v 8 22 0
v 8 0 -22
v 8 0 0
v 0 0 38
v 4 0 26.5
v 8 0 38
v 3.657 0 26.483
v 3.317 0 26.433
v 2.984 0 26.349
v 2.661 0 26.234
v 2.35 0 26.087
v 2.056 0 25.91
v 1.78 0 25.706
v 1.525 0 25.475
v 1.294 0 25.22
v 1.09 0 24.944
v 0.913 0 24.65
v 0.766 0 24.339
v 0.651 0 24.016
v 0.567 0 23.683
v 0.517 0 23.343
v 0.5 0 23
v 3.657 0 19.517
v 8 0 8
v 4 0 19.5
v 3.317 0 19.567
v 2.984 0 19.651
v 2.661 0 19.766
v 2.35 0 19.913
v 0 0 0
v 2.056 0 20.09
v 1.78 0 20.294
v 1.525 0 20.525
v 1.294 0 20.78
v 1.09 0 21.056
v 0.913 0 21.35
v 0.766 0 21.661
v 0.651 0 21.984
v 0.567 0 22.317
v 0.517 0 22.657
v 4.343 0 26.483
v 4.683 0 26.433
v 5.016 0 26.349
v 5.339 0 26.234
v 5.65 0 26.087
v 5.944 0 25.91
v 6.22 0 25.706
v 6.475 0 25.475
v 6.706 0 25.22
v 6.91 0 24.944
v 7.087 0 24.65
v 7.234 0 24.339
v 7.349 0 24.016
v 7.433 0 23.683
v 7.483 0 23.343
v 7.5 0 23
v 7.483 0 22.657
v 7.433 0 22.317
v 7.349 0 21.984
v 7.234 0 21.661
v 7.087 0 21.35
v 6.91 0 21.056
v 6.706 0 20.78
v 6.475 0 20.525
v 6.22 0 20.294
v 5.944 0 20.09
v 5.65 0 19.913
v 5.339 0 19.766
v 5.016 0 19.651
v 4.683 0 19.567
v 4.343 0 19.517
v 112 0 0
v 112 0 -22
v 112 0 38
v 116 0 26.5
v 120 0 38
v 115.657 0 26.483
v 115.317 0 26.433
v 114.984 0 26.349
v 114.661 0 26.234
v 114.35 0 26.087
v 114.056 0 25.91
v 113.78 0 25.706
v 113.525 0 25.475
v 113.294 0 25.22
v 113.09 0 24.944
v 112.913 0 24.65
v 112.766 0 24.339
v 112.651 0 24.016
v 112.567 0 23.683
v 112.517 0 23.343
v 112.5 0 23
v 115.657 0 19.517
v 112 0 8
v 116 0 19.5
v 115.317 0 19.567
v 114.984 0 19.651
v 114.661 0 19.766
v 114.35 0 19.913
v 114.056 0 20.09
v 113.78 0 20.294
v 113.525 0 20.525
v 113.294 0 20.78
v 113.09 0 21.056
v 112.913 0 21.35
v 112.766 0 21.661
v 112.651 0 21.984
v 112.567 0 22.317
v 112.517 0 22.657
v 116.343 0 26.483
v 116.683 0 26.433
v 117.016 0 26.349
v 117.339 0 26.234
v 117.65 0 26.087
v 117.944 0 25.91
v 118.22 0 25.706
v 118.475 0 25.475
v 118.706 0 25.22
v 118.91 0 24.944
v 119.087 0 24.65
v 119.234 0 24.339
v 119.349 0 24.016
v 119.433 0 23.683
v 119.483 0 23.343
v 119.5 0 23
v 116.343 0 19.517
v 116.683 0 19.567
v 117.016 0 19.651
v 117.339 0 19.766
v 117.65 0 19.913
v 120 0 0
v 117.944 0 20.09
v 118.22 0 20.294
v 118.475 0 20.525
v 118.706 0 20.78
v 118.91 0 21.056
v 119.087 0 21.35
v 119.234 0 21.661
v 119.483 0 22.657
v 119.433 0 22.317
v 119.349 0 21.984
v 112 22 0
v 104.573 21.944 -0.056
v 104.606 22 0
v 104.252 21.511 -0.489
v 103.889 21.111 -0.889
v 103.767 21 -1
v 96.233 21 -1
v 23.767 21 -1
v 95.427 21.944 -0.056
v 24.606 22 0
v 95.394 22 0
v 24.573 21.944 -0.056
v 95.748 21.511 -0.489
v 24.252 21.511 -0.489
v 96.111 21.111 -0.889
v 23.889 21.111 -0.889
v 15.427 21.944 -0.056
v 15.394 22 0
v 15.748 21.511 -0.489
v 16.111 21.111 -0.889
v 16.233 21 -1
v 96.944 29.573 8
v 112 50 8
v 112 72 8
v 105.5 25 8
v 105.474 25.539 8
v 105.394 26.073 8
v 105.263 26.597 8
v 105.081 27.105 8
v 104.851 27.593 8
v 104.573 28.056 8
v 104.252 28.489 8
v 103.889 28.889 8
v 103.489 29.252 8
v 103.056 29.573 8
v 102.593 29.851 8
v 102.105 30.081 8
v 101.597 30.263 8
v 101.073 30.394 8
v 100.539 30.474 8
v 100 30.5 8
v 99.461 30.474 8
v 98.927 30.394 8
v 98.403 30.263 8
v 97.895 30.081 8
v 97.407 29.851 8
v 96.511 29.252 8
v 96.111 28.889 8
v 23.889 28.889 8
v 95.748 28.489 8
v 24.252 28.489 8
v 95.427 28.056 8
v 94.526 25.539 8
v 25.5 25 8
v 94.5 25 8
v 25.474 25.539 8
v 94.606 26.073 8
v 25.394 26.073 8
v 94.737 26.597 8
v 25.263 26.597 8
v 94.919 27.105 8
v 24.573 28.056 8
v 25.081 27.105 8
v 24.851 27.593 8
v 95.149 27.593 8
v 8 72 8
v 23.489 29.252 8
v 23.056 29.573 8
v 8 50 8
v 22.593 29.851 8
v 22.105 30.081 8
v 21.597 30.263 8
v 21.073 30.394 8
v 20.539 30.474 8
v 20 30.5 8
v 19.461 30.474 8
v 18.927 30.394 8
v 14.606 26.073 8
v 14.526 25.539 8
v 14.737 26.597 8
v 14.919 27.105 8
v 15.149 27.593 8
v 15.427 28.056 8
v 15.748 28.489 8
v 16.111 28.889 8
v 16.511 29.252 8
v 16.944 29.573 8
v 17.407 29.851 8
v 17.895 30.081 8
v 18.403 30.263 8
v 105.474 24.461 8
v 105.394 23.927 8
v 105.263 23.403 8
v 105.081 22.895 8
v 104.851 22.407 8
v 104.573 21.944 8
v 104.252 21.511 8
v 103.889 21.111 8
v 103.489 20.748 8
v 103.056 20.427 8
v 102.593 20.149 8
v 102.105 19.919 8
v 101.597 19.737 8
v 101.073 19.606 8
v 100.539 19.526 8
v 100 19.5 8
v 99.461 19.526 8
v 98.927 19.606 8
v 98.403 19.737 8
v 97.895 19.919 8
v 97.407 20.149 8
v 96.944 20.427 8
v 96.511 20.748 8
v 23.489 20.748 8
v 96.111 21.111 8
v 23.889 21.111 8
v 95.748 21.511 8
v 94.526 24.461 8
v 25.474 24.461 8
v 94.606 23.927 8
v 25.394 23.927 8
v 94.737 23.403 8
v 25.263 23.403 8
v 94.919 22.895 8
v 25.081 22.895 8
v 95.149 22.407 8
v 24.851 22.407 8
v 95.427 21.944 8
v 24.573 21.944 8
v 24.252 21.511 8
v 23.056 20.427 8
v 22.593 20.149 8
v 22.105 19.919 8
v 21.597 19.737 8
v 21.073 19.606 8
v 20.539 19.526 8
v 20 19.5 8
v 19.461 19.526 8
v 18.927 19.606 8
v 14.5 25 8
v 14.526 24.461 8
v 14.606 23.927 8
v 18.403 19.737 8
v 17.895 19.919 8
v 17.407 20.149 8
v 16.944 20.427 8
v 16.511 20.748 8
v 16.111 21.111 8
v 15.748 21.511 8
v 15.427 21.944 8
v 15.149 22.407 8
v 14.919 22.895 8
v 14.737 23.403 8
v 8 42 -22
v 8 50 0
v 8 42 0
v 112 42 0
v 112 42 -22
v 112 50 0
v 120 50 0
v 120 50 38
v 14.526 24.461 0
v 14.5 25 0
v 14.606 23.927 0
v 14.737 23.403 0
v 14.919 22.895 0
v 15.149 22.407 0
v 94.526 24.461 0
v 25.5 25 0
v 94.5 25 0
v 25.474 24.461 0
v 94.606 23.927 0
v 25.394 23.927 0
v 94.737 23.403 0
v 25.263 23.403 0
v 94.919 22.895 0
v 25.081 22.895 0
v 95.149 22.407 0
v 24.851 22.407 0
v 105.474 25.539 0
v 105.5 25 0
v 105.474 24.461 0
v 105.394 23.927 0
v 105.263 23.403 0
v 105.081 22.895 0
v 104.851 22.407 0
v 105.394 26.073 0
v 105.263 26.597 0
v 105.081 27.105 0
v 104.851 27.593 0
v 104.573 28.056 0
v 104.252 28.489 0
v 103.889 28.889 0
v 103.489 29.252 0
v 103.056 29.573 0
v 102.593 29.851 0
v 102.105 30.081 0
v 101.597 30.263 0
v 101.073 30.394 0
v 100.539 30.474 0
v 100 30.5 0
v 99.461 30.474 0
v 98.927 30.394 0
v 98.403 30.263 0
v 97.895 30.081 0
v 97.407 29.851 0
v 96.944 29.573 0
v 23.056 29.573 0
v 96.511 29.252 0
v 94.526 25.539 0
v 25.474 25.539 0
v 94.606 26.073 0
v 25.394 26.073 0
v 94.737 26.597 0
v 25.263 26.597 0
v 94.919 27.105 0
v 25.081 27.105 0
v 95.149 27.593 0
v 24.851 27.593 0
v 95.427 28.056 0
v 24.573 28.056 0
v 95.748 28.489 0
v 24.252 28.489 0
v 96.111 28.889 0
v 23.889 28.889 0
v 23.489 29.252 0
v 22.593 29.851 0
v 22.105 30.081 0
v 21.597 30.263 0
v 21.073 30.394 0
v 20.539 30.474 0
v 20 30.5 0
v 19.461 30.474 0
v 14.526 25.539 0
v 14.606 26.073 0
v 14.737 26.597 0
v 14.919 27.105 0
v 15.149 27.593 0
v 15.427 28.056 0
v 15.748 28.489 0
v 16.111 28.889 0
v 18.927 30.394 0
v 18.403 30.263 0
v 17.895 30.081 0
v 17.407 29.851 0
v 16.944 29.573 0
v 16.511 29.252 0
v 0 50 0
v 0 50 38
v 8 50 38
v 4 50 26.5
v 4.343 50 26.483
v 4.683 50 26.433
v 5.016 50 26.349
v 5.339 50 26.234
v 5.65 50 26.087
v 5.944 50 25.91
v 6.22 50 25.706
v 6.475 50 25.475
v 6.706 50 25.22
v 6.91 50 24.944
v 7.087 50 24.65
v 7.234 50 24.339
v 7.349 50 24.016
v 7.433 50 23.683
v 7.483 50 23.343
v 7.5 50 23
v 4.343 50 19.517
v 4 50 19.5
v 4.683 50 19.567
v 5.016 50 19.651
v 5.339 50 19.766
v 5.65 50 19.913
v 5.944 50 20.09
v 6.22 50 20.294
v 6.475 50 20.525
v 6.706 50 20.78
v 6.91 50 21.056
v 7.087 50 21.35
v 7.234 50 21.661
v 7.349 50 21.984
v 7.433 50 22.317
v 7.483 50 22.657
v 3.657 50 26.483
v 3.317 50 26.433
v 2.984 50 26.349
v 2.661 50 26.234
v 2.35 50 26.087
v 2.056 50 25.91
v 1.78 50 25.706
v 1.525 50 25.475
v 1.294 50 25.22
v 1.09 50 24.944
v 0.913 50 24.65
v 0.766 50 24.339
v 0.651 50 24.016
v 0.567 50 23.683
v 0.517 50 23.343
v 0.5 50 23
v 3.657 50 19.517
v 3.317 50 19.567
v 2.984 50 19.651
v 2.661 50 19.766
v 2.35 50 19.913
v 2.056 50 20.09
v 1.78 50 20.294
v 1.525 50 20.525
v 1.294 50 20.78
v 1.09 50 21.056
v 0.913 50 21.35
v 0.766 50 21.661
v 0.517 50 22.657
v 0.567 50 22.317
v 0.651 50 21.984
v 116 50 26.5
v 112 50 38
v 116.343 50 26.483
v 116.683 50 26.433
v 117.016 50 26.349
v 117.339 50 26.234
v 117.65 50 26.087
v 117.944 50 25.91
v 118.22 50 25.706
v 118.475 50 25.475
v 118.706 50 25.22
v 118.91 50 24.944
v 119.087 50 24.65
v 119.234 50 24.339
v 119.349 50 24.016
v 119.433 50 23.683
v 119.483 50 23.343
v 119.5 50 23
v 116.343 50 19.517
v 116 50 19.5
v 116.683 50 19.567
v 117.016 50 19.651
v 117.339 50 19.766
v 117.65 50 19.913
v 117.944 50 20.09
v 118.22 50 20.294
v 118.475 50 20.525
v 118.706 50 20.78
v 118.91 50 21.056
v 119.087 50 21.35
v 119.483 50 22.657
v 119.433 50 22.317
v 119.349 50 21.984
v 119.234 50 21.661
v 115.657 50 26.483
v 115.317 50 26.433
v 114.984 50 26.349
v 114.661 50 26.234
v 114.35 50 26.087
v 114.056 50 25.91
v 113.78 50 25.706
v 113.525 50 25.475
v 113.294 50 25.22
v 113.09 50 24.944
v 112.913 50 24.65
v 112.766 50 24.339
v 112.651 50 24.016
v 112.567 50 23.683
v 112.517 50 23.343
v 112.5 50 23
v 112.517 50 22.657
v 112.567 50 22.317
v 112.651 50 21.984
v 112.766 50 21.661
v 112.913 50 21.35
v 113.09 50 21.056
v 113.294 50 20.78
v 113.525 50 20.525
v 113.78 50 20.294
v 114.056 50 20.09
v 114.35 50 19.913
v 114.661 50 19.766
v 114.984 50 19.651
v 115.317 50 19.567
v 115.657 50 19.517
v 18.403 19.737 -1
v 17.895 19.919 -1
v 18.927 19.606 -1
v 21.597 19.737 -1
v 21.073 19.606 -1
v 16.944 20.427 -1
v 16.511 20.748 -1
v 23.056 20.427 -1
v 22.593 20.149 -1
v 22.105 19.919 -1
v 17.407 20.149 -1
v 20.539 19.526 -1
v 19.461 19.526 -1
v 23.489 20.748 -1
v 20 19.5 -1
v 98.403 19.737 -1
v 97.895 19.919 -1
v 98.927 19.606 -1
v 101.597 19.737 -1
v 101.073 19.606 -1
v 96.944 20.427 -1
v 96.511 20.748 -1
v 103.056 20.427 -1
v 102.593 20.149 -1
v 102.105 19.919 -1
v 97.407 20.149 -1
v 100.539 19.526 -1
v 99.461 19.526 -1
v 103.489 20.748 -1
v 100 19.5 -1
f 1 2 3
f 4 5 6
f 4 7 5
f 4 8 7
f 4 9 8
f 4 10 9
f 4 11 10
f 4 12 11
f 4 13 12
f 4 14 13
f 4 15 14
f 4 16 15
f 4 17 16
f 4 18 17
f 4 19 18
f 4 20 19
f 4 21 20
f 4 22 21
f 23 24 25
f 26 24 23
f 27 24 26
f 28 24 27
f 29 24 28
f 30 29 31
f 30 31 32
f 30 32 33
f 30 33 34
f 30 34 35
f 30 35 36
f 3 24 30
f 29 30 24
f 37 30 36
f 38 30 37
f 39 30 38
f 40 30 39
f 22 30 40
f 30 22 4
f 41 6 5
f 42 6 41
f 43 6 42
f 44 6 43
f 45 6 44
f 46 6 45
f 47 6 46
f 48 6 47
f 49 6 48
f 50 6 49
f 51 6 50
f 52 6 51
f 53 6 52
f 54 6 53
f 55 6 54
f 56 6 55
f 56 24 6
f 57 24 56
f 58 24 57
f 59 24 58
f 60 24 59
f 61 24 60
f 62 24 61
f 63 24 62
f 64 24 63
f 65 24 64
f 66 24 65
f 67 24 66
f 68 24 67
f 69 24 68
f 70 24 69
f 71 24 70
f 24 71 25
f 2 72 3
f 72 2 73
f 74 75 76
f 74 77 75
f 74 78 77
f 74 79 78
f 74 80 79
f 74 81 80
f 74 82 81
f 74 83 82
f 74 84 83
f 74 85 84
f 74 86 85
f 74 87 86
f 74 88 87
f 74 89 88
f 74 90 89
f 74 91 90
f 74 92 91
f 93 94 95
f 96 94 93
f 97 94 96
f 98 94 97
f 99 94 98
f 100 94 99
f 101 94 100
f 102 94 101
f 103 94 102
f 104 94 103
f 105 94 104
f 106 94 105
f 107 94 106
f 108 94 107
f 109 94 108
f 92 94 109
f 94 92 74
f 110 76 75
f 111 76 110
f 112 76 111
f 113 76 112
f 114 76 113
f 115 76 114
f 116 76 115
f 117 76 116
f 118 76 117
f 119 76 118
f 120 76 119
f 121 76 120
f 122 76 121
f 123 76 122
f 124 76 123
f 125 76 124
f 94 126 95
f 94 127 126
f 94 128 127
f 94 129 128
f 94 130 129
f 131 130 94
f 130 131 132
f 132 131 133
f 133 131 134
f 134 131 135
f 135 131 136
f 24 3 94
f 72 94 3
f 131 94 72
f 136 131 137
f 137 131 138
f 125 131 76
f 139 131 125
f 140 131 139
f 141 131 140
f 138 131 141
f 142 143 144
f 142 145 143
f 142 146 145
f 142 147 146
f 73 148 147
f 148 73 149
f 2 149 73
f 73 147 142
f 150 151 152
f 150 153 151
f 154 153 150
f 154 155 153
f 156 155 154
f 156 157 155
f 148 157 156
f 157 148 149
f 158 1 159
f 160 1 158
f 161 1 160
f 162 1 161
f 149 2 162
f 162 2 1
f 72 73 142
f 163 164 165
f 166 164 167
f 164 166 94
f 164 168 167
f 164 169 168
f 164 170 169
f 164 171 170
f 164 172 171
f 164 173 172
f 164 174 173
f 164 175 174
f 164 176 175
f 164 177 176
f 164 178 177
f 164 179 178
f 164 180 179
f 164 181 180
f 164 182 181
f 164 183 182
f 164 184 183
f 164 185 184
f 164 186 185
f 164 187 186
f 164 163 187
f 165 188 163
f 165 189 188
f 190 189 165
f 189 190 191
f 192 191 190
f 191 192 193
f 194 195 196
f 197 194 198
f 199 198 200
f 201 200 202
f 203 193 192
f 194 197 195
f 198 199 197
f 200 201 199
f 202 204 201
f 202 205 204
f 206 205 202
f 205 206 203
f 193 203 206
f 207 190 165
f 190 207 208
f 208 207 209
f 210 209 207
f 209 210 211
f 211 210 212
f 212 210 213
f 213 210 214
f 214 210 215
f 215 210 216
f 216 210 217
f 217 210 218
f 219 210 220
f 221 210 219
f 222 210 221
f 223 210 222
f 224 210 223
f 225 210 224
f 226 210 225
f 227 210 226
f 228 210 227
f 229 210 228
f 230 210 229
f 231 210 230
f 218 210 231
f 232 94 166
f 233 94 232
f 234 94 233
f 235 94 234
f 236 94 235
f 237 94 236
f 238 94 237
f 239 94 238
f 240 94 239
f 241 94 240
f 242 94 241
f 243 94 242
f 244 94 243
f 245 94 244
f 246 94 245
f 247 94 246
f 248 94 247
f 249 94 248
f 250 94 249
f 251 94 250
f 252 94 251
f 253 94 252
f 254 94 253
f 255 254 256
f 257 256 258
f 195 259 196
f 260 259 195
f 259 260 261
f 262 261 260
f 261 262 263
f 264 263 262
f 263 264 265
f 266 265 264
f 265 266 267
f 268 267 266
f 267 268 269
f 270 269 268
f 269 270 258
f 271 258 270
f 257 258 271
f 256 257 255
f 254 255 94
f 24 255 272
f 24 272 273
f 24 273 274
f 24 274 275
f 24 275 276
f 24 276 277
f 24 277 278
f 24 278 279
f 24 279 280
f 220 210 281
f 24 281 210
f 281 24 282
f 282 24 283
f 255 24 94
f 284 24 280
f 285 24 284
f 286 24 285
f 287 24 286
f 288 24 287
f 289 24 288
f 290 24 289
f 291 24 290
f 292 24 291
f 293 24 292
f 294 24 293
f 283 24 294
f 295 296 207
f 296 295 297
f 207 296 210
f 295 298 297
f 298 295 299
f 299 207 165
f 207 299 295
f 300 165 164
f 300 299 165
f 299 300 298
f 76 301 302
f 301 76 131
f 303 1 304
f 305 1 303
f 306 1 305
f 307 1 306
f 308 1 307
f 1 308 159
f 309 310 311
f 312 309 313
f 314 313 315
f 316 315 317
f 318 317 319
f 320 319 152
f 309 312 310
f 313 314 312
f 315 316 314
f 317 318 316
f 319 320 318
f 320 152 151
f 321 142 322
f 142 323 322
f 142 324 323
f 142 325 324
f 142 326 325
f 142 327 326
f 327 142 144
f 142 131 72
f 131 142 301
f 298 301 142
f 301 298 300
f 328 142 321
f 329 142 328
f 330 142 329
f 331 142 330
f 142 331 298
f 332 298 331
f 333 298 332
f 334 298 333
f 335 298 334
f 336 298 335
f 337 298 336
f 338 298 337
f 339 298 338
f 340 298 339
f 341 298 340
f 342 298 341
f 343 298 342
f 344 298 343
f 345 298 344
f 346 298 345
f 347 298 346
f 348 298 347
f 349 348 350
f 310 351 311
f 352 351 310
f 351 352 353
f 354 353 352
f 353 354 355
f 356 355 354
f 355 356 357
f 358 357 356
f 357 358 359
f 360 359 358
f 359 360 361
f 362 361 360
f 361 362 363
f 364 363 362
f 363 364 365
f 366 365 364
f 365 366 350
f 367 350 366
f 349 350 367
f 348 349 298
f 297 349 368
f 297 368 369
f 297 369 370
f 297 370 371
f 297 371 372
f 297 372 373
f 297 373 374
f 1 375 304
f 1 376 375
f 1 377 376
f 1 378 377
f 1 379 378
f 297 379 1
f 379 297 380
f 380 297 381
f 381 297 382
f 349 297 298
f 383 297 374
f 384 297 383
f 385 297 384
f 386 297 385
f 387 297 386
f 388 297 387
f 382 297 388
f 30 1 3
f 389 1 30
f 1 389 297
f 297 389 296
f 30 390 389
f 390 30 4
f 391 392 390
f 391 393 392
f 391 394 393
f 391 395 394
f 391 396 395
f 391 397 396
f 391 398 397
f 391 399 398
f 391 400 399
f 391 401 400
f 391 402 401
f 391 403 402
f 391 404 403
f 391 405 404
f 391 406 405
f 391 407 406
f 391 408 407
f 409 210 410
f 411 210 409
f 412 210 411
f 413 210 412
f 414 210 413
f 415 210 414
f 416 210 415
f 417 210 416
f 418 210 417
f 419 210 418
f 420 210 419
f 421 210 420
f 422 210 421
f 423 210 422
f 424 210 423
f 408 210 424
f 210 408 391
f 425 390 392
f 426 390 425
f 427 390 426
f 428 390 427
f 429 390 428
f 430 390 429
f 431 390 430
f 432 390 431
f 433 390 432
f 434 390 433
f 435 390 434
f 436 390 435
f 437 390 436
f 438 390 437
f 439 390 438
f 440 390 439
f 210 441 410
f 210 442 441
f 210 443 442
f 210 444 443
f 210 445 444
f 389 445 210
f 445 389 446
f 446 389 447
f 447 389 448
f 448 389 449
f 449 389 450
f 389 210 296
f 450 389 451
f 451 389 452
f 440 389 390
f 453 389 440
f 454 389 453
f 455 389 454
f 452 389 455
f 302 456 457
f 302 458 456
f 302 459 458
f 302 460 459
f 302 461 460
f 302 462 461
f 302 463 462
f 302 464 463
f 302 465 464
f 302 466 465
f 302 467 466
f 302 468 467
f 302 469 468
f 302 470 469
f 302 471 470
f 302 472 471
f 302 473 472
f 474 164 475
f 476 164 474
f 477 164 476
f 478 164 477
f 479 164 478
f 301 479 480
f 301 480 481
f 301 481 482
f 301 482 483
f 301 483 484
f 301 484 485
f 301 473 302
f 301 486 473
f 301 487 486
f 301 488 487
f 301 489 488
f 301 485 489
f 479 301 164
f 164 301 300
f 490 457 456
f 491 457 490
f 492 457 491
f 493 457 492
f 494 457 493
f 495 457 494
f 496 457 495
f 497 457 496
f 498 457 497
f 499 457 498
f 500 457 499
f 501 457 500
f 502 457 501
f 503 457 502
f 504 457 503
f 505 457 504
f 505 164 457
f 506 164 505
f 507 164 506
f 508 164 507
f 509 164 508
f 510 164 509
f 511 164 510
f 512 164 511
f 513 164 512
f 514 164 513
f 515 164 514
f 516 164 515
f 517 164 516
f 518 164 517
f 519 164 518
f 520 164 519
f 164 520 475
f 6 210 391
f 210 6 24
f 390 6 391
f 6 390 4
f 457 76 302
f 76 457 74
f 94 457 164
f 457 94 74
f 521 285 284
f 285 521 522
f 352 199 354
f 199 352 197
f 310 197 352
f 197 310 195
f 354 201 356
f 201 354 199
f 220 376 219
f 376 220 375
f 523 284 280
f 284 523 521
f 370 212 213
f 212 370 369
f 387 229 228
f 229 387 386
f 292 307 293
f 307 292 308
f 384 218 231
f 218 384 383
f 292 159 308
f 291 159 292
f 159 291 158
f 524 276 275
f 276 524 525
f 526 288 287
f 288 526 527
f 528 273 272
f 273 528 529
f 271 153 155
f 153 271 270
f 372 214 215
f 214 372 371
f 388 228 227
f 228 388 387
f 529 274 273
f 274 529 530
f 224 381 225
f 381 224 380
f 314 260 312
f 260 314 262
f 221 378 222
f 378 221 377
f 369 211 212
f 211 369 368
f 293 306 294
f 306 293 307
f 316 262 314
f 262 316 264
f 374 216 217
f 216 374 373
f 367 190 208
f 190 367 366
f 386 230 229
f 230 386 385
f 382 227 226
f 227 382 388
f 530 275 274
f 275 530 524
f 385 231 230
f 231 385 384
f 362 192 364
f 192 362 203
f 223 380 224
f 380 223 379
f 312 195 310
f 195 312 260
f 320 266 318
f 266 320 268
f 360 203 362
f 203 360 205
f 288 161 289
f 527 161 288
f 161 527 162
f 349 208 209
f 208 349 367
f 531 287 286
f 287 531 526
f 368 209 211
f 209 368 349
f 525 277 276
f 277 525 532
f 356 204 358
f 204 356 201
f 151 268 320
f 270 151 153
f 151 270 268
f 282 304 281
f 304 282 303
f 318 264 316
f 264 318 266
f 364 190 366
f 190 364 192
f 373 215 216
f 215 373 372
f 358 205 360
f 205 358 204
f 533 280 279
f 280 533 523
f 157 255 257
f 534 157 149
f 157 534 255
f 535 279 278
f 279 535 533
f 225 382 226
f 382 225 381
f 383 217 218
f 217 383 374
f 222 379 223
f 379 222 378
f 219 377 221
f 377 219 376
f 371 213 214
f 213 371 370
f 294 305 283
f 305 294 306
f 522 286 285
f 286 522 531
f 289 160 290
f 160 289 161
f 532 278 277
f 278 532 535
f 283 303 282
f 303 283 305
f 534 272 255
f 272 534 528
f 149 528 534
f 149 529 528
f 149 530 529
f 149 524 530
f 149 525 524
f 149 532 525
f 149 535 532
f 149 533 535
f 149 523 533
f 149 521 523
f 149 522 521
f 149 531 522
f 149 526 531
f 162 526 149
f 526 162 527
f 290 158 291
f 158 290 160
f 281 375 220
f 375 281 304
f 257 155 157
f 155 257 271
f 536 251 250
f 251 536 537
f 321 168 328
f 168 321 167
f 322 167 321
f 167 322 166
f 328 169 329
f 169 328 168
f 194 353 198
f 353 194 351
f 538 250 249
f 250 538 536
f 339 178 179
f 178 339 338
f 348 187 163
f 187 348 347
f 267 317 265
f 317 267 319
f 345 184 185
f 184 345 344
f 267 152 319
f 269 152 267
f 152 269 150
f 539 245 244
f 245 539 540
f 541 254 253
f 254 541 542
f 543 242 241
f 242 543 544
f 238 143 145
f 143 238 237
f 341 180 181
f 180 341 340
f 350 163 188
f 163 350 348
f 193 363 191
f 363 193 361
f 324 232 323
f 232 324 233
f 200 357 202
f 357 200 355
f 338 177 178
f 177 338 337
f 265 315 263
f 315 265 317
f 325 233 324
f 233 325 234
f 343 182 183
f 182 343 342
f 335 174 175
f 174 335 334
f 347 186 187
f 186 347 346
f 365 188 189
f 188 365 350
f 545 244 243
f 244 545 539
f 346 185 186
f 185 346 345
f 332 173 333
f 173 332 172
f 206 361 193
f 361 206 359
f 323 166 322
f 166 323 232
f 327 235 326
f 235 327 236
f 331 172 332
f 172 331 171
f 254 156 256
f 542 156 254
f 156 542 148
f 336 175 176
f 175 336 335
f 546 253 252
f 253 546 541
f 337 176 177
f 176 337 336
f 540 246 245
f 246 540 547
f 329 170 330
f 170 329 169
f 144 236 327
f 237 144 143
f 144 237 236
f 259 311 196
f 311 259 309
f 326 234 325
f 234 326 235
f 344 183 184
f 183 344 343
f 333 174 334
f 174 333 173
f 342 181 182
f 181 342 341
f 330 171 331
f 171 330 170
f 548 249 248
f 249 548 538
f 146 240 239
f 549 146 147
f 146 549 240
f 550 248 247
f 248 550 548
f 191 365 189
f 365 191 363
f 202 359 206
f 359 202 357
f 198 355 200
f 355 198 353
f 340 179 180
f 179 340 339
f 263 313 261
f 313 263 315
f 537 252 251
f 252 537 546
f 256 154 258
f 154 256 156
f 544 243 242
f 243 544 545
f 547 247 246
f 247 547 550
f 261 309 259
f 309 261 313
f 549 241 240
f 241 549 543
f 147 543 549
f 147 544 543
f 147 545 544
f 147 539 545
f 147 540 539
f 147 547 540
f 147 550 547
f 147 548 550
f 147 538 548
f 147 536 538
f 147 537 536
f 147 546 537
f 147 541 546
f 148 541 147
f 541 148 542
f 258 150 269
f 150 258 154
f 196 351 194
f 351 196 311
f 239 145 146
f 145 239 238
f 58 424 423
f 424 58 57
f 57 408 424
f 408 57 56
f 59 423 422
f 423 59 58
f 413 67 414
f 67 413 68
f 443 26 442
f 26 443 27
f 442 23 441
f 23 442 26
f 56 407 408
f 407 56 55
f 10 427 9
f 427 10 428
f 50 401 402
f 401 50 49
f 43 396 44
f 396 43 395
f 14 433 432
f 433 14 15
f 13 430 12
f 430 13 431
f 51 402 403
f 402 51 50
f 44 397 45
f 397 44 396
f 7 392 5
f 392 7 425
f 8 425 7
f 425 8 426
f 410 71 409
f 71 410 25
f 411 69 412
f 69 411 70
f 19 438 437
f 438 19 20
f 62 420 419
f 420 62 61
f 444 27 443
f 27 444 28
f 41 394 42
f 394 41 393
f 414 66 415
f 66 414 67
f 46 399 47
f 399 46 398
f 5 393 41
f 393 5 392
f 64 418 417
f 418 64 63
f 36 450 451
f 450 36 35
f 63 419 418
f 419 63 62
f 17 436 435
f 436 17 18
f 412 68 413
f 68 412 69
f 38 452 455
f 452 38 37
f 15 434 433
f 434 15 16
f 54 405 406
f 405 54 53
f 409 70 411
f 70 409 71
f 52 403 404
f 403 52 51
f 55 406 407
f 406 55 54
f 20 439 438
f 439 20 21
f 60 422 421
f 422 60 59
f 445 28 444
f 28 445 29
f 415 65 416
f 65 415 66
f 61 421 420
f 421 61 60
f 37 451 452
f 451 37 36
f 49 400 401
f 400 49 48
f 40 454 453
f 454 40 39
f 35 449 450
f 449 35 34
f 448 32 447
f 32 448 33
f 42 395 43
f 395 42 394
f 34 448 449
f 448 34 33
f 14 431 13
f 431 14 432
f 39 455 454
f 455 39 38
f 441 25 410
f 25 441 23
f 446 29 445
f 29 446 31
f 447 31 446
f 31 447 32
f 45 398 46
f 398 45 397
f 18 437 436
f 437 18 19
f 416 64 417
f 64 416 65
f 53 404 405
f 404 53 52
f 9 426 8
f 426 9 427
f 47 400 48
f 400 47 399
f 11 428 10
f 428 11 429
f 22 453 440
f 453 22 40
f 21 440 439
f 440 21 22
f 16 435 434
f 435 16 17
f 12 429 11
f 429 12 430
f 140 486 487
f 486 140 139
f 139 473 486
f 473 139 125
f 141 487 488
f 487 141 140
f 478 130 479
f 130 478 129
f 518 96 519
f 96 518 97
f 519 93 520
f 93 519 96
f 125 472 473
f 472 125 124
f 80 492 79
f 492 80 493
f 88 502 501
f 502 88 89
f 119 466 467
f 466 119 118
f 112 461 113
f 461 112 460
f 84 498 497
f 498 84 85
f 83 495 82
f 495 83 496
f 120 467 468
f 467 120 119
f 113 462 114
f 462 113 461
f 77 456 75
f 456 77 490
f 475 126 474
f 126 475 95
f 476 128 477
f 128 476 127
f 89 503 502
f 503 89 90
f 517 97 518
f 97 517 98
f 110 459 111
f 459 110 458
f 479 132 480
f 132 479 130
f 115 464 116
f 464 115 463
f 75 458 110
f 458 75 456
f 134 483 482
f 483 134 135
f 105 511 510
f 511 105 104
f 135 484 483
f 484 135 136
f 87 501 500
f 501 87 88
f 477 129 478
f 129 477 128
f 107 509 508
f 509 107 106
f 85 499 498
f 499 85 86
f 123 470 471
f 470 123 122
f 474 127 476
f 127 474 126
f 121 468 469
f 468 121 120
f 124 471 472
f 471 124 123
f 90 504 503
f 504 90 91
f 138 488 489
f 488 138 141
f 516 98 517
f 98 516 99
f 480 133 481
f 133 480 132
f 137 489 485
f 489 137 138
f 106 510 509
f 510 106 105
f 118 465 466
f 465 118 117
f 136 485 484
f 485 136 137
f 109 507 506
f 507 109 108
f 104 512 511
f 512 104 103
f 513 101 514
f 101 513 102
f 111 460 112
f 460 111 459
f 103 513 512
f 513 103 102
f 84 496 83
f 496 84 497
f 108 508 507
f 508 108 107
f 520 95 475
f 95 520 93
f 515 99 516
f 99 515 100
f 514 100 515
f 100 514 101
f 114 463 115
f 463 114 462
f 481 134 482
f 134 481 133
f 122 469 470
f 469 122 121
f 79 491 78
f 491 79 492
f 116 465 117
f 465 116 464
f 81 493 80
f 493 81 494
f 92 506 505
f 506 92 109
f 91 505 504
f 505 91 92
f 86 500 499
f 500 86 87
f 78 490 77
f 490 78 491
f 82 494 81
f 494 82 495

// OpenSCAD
// Original MechIntel educational model. CC0-1.0. Units: mm.
// Not a standardized or load-rated component.
$fn=96;
length=120; width=50; web=8; side_height=38; rod_spacing=80; rod_clearance=11;
$fn=64;
difference(){
 union(){
  cube([length,width,web]);
  cube([web,width,side_height]);
  translate([length-web,0,0]) cube([web,width,side_height]);
  for(y=[0,width-web]) translate([web,y,web]) rotate([0,90,0]) linear_extrude(height=length-2*web) polygon([[0,0],[side_height-web,0],[0,side_height-web]]);
 }
 for(x=[(length-rod_spacing)/2,(length+rod_spacing)/2]) translate([x,width/2,-1]) cylinder(d=rod_clearance,h=web+2);
 for(x=[web/2,length-web/2]) translate([x,-1,side_height-15]) rotate([-90,0,0]) cylinder(d=7,h=width+2);
}
